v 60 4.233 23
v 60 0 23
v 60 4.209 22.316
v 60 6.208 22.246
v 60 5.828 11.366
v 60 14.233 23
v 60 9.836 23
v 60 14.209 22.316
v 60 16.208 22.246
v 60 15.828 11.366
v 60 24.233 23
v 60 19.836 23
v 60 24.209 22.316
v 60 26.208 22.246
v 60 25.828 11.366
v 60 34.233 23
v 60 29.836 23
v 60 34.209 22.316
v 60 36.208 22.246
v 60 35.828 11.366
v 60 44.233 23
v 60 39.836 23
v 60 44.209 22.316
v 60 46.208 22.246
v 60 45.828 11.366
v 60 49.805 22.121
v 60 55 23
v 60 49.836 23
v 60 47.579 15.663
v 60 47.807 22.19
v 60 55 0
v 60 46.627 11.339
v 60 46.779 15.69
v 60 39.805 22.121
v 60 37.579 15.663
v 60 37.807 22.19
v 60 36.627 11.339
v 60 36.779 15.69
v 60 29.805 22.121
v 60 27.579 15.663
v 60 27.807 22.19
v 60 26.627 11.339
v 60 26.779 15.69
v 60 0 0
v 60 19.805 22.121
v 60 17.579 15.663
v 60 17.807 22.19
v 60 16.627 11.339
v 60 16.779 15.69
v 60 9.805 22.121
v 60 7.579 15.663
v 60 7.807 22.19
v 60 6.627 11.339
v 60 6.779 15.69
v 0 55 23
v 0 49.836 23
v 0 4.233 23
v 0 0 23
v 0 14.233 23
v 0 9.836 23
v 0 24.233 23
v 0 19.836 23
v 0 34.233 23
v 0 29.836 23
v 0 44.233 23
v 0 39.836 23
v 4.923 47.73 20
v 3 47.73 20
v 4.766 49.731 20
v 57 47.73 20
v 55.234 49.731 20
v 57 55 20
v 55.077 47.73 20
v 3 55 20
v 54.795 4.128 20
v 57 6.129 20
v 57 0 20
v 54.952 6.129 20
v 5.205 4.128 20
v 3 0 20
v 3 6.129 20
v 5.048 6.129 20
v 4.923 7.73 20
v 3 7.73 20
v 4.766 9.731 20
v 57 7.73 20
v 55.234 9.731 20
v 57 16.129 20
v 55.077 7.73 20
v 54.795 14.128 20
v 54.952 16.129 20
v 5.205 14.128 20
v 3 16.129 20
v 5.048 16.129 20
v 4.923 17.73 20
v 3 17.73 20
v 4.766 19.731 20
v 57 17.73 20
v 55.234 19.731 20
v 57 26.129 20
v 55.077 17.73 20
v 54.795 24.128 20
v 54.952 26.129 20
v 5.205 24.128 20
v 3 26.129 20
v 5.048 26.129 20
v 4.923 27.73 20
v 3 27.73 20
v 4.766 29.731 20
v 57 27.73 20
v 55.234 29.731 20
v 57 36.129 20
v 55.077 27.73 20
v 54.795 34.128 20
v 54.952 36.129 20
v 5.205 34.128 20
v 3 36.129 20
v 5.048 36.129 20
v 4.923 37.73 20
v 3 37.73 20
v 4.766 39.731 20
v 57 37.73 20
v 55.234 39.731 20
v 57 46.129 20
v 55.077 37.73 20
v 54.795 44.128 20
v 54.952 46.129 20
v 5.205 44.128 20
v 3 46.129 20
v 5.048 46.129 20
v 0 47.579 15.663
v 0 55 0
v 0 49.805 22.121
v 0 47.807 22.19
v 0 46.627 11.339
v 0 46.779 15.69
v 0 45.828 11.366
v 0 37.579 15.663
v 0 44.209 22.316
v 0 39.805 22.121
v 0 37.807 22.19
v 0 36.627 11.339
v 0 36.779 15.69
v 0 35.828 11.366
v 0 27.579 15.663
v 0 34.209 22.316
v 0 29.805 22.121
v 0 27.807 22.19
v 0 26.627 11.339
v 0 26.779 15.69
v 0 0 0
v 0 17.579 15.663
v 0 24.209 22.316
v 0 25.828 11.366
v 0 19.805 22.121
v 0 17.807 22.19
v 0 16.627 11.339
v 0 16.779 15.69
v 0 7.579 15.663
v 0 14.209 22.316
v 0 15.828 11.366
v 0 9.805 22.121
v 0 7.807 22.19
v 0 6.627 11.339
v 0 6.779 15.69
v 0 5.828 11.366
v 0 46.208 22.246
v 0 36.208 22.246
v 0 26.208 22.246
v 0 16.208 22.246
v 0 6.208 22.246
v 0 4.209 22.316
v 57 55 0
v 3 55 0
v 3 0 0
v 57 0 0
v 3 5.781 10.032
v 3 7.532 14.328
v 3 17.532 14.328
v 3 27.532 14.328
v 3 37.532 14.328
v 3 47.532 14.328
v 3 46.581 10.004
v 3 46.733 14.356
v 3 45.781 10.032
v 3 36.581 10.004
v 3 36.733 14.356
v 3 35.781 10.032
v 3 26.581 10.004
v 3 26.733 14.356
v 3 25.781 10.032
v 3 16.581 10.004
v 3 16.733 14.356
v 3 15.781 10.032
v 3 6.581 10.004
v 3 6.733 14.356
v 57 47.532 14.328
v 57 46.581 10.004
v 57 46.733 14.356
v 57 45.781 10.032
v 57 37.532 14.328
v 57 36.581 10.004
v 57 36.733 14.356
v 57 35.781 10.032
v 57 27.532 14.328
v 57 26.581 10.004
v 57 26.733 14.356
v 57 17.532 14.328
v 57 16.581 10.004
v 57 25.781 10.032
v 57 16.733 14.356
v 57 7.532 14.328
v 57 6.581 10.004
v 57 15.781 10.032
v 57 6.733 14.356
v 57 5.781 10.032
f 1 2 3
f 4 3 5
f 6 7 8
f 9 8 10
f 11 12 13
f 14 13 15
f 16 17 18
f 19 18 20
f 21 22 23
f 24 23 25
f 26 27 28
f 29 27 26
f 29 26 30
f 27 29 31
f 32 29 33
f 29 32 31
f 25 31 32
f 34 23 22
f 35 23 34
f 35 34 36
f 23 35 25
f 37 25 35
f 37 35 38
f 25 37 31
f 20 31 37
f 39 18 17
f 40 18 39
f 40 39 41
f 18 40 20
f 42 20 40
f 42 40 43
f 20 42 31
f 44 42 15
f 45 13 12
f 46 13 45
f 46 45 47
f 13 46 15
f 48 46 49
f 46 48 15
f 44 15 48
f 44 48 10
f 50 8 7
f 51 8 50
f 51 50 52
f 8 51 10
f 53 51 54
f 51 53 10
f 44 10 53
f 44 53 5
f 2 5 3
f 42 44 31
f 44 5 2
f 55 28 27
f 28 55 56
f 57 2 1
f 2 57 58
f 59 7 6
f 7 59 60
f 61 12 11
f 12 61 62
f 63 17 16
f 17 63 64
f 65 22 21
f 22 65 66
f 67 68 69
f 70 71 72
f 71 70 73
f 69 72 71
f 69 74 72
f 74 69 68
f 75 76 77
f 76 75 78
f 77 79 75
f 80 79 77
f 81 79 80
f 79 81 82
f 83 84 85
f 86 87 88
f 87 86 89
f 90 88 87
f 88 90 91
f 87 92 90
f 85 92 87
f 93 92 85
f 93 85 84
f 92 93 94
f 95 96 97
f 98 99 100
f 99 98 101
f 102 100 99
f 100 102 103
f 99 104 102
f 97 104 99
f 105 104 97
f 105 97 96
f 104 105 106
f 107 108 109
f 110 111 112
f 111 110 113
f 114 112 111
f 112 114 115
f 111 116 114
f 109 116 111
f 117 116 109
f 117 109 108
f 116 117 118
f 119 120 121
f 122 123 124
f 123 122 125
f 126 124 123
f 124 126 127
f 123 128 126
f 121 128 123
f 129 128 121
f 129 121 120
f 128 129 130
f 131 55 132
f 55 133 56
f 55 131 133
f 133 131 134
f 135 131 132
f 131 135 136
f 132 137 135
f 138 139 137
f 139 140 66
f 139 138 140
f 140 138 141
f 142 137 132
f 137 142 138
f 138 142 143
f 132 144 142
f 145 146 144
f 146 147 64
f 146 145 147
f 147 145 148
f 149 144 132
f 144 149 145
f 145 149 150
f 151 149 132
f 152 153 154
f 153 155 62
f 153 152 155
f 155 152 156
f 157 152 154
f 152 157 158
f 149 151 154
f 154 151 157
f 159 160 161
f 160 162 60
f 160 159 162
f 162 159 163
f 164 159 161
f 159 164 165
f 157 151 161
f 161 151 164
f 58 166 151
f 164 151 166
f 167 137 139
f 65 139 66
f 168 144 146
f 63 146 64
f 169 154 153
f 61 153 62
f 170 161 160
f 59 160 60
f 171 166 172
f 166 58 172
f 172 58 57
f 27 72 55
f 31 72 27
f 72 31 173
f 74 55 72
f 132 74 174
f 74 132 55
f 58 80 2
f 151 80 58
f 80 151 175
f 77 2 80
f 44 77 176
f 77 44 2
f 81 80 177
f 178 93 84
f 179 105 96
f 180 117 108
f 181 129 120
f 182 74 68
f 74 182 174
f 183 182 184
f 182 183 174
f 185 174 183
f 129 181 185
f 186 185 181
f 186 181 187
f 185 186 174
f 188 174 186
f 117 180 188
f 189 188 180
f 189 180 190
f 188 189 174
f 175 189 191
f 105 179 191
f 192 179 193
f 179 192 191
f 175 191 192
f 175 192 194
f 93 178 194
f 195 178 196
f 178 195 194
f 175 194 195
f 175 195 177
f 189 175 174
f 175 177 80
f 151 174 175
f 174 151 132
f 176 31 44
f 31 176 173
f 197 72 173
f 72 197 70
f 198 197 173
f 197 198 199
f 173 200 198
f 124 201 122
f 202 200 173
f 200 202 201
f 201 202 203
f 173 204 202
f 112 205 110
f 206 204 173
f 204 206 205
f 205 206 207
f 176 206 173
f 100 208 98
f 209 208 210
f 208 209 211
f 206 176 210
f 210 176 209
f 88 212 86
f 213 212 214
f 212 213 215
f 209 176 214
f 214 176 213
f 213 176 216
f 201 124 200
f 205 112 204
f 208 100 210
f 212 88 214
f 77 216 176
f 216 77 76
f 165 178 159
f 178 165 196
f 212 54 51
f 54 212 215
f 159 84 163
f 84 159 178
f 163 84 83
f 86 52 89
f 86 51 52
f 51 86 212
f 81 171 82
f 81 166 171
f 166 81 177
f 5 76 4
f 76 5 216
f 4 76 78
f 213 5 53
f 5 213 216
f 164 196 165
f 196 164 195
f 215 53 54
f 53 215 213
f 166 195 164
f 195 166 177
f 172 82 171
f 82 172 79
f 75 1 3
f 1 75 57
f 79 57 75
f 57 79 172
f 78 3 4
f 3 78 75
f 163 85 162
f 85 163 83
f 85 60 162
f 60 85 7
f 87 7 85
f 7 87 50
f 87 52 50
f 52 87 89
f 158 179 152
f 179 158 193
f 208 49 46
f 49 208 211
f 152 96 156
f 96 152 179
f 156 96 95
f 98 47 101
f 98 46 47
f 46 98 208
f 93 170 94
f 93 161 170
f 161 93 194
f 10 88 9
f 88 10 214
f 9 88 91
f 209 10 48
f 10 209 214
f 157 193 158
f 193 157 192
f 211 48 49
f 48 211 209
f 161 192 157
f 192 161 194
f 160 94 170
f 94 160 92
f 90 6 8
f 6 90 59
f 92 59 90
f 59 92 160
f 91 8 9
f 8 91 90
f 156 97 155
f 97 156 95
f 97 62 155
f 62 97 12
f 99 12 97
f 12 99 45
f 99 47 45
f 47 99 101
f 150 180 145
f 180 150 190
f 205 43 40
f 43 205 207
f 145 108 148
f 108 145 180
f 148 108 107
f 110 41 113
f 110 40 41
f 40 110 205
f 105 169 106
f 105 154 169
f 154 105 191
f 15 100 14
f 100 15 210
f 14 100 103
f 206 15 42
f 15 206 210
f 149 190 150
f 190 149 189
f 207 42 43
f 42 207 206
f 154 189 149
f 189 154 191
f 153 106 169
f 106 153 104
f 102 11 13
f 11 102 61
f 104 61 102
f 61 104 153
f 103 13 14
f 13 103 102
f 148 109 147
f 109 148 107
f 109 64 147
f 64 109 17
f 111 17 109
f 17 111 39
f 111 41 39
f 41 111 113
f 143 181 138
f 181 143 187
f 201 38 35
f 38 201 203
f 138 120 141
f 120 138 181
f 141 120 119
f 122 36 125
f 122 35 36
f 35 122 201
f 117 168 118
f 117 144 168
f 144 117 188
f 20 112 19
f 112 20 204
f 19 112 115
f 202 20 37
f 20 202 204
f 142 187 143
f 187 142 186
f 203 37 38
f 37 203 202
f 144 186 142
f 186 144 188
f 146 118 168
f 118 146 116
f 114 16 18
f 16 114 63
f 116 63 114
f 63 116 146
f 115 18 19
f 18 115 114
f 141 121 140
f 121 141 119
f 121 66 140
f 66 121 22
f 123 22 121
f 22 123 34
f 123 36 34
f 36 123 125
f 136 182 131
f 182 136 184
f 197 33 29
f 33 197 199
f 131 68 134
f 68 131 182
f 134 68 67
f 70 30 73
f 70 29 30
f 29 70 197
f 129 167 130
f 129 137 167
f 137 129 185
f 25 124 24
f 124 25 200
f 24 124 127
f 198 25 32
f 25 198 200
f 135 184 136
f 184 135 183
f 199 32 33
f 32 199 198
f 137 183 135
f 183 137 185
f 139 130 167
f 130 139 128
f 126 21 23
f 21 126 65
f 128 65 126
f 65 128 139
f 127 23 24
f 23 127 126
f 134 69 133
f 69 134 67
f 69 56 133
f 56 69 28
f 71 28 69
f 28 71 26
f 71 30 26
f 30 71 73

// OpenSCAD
// This work is licensed under a Creative Commons Attribution-ShareAlike 4.0 International License (http://creativecommons.org/licenses/by-sa/4.0/)

width=60;
length=55;
height=20;
thickness=3;

diskThickness=0.8;
instrumentThickness=2;
instrumentDiameter=140;
diskDiameter=160;
diskBorder=8;

module knife() {
    union() {
        cylinder(d=diskDiameter-diskBorder, h=diskThickness+0.1);
        translate([0, 0, diskThickness]) cylinder(d=diskDiameter, h=diskThickness);
        translate([0, 0, 2*diskThickness-0.1]) cylinder(d=instrumentDiameter, h=instrumentThickness+0.1);
        translate([0, 0, -instrumentThickness]) cylinder(d=instrumentDiameter, h=instrumentThickness+0.1);
    }
}

difference() {
    
    union() {
        translate([0, 0, 20]) cube([width, length, thickness]);
        cube([thickness, length, height]);
        translate([width - thickness, 0, 0]) cube([thickness, length, height]);
    }
    
    for (y = [10:10:length]) {
        translate([width/2, y, 85]) rotate([88, 0, 0]) #knife();
    }
}
